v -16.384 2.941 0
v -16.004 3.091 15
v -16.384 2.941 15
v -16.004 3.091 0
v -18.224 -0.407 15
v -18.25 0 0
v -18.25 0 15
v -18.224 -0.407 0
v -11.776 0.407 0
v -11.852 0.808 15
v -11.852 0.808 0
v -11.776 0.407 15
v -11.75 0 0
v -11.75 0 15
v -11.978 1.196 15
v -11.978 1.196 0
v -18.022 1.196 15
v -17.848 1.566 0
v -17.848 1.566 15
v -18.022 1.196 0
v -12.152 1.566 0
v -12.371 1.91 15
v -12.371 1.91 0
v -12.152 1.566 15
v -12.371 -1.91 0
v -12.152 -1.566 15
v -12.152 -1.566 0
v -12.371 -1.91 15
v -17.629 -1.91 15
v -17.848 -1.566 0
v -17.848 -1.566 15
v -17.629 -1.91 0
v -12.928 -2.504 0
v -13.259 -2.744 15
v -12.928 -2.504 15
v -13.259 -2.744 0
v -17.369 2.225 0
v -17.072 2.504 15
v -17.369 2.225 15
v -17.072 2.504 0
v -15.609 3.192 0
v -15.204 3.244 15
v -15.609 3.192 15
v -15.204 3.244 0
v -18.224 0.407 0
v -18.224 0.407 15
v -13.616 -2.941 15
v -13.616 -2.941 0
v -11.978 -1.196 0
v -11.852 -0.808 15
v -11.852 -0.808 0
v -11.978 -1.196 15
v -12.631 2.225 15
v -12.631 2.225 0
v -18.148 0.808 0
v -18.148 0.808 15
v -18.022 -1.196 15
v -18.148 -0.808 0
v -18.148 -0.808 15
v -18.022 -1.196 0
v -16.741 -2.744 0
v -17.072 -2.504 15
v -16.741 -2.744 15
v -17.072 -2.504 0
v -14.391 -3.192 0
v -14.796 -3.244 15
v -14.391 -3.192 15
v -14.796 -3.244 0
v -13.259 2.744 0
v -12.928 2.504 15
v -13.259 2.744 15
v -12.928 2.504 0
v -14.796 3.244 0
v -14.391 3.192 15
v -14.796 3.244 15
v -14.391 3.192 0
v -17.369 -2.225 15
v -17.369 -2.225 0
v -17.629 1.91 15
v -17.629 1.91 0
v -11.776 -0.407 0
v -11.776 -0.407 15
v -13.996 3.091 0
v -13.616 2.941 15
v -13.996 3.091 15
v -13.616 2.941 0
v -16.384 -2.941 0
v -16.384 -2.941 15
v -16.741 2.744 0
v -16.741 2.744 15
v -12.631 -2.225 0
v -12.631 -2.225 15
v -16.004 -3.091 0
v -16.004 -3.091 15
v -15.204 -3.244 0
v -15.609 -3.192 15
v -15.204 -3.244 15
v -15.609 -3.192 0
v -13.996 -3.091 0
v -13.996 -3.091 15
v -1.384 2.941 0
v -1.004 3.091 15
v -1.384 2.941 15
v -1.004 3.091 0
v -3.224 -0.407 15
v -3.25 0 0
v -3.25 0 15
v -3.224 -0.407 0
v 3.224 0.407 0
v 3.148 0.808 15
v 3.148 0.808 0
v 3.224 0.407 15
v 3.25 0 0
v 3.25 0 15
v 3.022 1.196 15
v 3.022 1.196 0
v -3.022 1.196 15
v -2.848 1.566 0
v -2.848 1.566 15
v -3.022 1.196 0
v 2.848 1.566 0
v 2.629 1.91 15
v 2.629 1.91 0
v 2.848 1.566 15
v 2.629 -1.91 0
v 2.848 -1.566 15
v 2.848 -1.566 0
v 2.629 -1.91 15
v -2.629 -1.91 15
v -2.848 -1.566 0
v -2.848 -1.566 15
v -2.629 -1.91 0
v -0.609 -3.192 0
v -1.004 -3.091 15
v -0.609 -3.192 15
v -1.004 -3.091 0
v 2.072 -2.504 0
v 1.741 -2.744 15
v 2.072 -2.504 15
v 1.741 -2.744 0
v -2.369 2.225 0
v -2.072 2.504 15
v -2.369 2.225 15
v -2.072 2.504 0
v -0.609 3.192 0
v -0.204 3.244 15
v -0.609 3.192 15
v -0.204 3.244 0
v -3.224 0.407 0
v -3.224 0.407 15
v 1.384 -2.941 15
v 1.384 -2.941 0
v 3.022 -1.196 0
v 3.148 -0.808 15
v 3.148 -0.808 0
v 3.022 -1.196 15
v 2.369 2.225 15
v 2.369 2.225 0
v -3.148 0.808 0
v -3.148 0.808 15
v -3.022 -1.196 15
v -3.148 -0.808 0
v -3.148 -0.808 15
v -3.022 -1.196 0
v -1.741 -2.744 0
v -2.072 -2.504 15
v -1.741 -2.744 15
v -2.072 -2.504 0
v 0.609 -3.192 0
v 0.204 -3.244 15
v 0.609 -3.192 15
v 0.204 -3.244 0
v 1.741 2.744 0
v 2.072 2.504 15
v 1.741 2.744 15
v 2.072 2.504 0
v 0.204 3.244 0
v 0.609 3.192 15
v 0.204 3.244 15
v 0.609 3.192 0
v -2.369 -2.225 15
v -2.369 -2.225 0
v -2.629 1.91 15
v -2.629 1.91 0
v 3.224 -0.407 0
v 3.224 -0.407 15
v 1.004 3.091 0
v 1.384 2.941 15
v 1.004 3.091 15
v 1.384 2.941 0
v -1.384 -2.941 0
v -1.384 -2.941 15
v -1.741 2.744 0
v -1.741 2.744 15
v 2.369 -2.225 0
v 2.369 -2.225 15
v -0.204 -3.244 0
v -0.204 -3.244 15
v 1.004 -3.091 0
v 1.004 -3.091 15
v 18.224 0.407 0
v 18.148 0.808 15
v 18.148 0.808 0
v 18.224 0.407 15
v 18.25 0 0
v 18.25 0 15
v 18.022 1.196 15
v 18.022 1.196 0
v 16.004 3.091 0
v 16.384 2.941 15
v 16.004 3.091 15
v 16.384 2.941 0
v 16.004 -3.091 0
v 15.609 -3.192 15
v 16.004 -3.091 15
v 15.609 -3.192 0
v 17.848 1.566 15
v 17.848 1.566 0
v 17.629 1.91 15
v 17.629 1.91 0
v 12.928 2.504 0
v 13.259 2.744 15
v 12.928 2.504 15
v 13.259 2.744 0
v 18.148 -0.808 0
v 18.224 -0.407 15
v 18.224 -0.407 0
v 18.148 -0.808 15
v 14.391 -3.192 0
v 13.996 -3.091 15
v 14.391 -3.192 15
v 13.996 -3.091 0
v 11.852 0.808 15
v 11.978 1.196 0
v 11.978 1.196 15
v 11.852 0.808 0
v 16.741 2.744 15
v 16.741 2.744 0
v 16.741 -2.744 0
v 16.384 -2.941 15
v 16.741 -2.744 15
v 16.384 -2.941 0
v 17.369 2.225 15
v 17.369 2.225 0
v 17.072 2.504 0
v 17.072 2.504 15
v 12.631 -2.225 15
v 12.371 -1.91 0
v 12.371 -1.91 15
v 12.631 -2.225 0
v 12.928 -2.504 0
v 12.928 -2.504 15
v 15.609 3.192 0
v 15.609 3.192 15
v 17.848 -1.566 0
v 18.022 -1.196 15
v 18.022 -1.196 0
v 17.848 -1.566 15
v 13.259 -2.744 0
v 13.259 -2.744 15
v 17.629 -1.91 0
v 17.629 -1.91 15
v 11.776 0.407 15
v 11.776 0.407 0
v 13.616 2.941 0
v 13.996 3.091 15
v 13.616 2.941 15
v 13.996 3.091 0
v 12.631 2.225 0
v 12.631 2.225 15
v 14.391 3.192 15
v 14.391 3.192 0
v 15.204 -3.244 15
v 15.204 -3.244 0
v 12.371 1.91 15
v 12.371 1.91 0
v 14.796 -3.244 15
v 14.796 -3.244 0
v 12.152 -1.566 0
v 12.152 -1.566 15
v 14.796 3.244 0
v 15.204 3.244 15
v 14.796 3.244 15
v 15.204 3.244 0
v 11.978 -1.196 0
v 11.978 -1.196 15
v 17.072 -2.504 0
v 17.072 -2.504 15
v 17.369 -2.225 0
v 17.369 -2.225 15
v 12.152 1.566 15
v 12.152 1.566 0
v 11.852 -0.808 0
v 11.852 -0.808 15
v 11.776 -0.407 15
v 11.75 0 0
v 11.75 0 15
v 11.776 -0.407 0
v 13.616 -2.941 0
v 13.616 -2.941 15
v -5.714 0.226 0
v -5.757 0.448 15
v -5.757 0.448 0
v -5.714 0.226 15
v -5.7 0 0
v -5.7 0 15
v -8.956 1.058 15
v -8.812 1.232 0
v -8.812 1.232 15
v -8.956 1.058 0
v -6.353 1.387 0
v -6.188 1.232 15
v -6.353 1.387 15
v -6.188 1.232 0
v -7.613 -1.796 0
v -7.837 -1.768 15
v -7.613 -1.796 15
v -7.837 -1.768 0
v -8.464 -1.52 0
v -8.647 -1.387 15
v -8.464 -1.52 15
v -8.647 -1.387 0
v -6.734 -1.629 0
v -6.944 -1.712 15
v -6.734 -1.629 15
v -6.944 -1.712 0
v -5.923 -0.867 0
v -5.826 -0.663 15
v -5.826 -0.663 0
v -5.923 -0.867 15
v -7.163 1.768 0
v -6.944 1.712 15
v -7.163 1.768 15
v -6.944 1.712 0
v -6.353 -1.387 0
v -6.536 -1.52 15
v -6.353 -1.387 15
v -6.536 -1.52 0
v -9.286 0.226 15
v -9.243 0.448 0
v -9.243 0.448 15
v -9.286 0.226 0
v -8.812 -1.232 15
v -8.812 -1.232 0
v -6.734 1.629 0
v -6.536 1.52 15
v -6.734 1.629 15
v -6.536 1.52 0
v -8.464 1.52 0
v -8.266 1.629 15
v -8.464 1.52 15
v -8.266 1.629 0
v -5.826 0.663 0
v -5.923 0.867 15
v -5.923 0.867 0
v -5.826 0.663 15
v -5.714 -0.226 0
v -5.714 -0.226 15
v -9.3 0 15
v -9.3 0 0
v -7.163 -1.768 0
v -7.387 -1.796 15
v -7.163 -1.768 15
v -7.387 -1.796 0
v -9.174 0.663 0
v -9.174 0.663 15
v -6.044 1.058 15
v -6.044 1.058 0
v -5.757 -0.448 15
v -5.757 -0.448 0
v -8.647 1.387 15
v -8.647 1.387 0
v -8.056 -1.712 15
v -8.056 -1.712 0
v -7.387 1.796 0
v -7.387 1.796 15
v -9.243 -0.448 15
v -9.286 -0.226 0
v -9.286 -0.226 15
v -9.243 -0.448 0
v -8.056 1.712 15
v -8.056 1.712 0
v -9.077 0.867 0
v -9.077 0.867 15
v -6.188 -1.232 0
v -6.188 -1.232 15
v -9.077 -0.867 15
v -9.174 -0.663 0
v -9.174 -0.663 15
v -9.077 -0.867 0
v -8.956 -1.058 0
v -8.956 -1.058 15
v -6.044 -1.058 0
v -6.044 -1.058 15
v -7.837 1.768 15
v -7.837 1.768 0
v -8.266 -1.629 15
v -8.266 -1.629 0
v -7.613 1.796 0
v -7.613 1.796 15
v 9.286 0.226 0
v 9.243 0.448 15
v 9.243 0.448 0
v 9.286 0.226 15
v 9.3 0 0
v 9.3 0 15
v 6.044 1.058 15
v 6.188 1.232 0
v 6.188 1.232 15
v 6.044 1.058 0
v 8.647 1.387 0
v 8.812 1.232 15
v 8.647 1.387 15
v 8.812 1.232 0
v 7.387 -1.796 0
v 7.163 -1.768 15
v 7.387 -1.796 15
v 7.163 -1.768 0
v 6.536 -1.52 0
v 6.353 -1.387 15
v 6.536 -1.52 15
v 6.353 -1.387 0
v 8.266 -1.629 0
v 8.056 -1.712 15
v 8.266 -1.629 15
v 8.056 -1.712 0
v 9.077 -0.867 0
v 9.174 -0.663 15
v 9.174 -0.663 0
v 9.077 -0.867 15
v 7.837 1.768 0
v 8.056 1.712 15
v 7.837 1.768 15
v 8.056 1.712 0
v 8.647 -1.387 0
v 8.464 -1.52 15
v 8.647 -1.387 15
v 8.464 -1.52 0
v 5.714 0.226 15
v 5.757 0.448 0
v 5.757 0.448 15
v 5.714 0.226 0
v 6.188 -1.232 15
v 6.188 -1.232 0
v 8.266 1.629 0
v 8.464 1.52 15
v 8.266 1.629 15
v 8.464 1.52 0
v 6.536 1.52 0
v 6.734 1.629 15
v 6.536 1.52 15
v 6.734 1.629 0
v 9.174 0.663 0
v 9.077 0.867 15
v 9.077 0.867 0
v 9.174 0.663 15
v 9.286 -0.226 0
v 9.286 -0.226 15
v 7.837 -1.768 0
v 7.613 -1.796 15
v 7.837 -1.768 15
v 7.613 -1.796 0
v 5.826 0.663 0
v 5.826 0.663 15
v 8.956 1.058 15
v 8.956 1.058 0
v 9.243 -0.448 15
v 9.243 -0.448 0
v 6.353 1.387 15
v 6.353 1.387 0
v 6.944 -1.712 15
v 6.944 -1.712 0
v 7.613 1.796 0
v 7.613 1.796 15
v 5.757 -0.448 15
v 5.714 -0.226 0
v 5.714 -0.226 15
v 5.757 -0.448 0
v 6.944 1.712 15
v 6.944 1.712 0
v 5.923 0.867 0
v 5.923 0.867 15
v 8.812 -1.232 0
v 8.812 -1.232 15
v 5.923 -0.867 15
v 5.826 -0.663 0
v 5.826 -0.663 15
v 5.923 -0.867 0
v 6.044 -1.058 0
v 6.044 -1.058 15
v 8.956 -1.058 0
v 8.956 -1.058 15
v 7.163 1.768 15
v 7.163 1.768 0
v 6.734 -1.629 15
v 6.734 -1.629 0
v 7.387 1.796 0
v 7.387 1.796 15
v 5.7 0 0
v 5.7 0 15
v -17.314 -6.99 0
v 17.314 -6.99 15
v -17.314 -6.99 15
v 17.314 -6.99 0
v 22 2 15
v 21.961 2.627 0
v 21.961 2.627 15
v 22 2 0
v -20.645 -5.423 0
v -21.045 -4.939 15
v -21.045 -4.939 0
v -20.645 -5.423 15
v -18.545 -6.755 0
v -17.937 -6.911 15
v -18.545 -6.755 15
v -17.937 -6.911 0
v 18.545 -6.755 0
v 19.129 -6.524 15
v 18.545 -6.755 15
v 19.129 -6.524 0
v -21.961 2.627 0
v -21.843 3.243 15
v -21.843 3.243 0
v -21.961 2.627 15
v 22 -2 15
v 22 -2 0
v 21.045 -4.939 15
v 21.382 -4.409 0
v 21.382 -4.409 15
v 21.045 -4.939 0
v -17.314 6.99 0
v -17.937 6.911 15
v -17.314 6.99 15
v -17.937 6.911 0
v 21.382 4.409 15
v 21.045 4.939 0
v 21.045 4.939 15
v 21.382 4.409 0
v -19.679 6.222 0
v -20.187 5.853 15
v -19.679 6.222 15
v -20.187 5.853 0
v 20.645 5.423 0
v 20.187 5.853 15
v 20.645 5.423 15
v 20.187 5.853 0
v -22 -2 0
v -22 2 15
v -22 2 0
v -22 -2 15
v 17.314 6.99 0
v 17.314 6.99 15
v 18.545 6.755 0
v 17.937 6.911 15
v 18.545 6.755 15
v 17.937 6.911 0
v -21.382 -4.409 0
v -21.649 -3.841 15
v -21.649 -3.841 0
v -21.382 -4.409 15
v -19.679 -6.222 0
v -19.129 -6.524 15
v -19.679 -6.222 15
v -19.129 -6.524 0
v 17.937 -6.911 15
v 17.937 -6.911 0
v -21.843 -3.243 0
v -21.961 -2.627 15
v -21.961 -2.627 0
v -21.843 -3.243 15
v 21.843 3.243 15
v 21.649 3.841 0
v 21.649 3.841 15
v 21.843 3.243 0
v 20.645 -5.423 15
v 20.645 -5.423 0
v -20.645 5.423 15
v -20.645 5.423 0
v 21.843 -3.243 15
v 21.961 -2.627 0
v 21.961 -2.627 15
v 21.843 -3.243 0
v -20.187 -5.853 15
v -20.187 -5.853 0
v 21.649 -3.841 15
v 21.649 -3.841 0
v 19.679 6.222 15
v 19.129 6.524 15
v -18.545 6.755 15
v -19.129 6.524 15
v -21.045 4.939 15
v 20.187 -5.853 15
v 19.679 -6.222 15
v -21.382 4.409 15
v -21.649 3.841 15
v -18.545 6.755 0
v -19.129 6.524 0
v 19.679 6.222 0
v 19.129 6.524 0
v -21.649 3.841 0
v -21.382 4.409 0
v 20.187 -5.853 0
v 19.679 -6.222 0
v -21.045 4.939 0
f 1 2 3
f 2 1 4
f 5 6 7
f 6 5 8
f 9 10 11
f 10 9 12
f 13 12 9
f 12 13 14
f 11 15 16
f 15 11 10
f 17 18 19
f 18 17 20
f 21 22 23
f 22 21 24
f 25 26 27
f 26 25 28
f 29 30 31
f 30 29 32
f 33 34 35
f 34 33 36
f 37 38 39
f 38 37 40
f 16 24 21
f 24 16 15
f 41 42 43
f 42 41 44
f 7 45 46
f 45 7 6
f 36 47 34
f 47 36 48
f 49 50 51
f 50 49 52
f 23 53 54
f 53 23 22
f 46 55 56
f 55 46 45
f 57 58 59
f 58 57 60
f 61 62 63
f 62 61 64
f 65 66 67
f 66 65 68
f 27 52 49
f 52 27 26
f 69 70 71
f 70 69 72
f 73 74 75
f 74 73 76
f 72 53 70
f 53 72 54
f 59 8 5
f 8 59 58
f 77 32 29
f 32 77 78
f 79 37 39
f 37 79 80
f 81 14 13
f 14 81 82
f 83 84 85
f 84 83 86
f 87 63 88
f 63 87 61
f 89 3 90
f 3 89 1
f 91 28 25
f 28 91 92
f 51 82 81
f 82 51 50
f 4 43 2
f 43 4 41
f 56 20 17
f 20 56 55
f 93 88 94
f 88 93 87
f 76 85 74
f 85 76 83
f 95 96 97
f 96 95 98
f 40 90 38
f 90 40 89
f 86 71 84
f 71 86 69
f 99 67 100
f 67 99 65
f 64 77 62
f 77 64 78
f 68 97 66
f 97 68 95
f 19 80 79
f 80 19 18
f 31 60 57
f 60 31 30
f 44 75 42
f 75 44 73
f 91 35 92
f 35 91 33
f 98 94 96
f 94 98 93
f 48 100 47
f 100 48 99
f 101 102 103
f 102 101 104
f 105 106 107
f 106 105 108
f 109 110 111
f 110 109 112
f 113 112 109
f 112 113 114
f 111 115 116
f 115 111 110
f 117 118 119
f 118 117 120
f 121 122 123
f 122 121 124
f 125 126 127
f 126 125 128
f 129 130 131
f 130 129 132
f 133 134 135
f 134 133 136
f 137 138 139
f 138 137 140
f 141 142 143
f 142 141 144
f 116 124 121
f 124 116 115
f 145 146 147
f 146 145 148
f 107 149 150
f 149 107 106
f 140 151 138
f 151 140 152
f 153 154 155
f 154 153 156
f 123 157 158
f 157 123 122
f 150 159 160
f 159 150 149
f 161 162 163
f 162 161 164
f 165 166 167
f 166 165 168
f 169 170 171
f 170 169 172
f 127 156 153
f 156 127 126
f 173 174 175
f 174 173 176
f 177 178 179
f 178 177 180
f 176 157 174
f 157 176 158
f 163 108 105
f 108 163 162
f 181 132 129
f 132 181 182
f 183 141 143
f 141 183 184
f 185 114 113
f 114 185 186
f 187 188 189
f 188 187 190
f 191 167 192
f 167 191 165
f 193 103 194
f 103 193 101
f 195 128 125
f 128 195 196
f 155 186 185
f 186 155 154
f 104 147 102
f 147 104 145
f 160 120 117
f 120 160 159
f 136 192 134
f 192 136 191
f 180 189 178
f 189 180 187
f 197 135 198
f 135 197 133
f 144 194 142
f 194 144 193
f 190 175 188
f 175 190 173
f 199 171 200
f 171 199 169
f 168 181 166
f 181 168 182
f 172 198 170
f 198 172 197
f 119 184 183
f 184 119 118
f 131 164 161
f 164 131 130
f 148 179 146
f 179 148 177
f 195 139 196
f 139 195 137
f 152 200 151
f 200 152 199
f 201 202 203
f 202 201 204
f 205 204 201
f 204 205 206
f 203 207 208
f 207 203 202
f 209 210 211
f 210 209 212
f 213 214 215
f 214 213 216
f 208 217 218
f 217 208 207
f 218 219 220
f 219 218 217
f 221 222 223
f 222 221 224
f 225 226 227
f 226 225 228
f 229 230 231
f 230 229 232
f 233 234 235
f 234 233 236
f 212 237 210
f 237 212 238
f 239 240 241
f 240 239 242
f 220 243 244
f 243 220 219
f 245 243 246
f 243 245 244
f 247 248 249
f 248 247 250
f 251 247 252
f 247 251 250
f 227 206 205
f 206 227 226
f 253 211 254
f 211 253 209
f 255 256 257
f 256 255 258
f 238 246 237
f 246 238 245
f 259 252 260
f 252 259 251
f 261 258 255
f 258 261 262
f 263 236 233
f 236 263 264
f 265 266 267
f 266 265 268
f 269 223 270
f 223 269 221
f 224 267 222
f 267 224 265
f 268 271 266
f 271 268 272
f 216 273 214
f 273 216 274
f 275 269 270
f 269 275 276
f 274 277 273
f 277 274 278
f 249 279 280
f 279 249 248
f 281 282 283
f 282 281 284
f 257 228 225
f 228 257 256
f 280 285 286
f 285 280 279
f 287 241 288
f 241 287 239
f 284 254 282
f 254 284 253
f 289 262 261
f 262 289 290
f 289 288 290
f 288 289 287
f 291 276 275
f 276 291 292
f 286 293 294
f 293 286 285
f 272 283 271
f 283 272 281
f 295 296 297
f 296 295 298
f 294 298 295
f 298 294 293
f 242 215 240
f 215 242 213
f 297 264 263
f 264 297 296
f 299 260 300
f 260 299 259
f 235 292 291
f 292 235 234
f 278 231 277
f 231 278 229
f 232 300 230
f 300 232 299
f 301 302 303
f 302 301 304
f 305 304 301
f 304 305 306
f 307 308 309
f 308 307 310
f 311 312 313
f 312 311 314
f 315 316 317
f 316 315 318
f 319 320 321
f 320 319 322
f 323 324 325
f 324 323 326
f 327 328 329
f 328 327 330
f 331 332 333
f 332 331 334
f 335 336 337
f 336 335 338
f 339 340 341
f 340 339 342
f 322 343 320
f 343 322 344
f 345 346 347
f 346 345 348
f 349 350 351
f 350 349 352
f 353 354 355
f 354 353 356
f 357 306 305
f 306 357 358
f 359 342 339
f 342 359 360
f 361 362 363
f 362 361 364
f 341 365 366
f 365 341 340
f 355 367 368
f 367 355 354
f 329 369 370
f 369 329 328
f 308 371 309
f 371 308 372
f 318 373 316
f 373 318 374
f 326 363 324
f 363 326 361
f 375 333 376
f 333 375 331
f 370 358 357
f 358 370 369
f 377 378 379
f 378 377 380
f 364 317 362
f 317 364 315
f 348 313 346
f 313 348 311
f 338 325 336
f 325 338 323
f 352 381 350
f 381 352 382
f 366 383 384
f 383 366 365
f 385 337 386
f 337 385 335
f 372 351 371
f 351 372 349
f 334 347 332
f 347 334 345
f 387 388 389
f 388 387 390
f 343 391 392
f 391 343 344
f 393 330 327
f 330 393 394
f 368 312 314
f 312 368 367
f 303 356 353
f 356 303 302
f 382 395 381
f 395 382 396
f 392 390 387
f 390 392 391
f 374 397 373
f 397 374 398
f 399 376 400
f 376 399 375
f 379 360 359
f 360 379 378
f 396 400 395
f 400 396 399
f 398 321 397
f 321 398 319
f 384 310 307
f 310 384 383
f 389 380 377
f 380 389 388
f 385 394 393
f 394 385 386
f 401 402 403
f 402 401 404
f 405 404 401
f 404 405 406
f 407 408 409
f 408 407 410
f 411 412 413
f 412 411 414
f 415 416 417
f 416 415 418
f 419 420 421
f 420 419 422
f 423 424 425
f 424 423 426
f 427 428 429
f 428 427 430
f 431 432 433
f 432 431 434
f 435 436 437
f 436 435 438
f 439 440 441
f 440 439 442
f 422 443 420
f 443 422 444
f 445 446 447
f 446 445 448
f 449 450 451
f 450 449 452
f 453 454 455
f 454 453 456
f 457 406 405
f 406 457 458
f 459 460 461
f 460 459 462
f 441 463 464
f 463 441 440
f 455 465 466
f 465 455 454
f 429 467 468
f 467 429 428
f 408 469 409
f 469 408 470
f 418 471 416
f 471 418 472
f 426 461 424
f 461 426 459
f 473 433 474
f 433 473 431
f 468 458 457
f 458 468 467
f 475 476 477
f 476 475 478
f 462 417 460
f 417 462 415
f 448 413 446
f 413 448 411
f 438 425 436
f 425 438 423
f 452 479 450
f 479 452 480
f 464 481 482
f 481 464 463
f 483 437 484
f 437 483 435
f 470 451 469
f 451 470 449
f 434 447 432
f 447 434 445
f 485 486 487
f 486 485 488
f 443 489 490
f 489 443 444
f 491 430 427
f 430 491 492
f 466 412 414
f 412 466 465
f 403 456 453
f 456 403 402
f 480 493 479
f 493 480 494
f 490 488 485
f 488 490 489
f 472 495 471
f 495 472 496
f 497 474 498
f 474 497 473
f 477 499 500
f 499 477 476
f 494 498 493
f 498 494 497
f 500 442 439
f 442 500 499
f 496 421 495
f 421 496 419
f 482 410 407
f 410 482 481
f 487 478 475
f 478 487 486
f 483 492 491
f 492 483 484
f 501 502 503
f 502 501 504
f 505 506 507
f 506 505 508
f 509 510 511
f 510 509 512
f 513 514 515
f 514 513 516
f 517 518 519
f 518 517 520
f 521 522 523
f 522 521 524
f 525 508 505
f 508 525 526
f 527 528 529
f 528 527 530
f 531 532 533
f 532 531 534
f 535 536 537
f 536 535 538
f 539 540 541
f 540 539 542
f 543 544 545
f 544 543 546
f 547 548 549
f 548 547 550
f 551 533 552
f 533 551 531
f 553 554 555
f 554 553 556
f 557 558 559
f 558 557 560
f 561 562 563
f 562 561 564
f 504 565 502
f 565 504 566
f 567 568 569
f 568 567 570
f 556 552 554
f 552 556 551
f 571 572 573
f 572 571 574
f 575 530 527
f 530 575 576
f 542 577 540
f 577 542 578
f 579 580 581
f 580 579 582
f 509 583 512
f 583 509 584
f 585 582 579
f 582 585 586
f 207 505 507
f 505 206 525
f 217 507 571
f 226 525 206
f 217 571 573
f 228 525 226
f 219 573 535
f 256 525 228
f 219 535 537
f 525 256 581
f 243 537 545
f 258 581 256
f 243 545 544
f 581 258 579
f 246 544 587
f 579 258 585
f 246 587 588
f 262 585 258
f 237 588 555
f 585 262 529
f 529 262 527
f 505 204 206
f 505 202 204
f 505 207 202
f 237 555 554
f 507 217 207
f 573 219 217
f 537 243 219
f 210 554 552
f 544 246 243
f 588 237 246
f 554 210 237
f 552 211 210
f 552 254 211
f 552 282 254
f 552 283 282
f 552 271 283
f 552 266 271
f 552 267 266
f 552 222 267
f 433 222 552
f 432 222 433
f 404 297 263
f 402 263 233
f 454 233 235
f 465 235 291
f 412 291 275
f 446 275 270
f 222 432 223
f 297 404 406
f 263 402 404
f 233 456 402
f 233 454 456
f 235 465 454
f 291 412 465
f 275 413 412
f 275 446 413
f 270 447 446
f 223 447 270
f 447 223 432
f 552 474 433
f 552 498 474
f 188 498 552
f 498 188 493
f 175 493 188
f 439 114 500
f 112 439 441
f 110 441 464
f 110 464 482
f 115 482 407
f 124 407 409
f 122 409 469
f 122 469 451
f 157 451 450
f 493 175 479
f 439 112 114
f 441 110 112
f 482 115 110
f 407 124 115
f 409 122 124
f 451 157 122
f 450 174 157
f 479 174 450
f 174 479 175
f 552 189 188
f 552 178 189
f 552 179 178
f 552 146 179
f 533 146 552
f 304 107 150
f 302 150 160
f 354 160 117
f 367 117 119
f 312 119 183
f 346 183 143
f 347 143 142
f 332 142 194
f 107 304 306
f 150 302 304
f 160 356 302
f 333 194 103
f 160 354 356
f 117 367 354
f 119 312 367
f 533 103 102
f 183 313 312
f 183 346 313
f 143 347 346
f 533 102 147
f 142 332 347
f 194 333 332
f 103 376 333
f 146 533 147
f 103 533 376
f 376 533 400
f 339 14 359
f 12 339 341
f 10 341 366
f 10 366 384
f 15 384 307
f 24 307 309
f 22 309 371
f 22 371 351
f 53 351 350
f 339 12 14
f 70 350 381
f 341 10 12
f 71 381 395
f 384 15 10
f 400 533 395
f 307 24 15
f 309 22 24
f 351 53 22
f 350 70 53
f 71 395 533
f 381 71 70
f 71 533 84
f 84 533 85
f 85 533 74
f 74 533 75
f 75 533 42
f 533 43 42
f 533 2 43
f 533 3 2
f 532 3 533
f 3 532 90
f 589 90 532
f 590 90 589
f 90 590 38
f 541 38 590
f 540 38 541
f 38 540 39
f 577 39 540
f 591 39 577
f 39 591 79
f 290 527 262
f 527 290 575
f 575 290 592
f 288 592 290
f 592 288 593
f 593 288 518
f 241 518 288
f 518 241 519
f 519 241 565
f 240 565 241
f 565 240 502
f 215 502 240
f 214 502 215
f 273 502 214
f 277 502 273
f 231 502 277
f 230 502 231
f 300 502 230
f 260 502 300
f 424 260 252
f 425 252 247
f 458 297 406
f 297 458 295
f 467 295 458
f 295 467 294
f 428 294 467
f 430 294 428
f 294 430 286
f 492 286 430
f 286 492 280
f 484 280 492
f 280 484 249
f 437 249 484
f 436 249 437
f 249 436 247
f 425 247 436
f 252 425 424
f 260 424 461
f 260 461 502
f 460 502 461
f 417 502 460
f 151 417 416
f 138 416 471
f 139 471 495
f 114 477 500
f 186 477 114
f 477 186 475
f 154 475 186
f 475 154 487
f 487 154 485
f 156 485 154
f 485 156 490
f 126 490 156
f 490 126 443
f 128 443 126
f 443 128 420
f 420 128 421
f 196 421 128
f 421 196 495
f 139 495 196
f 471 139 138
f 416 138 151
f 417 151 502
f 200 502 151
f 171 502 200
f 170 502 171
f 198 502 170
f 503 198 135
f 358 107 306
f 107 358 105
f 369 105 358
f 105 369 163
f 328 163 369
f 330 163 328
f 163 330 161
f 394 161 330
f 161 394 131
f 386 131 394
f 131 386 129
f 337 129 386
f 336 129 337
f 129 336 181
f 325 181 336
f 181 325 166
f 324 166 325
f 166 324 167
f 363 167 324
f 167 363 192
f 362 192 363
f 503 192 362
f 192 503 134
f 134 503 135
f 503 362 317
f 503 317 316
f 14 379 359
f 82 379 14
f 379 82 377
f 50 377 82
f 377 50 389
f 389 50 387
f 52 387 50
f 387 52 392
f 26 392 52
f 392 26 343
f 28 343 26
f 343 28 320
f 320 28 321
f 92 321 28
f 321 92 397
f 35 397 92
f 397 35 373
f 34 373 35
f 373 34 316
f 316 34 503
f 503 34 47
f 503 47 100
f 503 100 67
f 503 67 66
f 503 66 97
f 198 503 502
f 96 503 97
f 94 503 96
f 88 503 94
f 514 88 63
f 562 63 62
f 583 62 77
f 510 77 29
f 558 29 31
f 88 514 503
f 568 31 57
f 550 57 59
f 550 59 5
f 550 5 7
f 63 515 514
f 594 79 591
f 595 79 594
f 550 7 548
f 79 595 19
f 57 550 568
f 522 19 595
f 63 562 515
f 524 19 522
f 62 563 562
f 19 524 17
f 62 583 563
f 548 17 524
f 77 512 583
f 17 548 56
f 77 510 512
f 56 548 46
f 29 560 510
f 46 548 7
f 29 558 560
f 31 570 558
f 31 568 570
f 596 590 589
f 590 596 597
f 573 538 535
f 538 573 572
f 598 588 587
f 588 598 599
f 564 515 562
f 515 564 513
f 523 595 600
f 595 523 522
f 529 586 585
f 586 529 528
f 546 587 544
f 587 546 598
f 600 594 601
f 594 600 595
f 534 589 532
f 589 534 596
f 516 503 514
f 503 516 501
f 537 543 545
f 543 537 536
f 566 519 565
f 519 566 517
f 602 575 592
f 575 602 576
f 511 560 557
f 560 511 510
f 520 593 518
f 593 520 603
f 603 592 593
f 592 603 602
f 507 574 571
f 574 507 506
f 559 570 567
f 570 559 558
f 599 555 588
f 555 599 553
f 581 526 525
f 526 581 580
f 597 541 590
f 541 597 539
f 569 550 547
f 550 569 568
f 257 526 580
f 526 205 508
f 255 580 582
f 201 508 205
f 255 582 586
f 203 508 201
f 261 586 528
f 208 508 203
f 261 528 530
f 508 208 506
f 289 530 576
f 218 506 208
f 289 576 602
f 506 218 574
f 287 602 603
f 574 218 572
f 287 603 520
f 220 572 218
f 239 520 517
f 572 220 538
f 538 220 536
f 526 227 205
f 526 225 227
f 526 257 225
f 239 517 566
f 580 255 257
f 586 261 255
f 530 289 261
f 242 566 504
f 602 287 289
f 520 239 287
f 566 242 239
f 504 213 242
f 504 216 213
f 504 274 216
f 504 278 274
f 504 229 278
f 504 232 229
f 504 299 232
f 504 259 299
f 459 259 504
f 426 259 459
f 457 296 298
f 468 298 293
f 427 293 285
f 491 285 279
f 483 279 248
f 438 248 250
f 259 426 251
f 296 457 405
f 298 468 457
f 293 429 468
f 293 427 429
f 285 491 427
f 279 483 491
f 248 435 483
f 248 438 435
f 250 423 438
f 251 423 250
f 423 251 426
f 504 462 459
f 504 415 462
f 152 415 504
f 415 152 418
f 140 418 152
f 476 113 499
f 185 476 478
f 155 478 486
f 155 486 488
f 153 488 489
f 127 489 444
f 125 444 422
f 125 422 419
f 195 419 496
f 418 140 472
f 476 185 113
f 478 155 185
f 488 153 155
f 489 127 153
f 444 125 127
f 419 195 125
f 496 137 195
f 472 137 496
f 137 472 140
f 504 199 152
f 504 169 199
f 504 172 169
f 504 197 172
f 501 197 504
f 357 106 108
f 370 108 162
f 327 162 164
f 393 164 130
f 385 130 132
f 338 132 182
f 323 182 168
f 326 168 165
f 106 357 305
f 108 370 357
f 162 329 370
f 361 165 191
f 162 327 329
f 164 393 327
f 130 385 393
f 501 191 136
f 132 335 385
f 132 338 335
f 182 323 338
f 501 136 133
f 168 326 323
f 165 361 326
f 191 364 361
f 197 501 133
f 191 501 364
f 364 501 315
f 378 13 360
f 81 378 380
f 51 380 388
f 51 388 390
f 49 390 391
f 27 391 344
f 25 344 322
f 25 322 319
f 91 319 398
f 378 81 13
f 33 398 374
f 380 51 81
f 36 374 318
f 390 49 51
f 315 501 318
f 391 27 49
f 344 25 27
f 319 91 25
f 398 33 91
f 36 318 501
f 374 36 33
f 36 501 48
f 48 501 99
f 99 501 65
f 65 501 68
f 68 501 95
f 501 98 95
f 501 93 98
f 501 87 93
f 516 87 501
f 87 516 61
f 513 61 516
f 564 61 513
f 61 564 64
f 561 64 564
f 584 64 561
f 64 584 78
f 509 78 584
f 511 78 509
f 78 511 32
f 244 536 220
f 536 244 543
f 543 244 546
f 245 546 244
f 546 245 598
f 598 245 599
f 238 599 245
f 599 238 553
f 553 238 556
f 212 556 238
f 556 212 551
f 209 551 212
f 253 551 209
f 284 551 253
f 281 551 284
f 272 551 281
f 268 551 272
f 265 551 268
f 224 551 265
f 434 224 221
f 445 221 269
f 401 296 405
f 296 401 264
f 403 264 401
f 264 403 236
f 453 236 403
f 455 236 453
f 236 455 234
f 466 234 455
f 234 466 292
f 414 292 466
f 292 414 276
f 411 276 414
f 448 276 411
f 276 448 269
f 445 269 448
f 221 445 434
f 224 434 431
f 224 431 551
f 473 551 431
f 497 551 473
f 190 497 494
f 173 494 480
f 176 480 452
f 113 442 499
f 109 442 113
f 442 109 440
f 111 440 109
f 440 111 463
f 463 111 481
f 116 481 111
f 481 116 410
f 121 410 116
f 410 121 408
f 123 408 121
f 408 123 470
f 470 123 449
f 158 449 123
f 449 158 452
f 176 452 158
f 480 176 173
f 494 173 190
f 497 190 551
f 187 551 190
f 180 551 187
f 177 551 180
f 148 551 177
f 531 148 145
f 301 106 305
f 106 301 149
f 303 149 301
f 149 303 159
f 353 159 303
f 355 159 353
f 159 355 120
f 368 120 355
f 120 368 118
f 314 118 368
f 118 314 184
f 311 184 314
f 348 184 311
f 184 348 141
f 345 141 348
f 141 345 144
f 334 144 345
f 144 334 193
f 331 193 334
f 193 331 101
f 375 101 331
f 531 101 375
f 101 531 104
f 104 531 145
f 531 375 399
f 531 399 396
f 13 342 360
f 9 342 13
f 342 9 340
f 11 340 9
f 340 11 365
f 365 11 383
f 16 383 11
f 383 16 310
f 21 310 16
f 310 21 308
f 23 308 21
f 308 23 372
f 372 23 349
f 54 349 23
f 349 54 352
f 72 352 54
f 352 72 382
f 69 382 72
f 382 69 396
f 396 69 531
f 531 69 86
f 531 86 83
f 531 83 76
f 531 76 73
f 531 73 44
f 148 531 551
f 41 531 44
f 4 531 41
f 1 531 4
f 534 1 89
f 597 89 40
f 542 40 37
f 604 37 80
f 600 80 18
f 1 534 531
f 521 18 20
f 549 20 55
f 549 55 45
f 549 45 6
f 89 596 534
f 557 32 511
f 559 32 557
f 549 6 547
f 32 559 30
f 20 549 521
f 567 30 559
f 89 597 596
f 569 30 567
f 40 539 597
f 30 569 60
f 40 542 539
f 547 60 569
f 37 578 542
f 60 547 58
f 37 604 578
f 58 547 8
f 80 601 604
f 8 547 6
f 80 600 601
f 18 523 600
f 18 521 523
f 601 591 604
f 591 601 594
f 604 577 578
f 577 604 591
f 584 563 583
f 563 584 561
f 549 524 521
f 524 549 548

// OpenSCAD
$fn = 50;


difference() {
	union() {
		*color(alpha = 1.0000000000, c = "gray") {
			translate(v = [0, 7, 0]) {
				linear_extrude(height = 1) {
					text(font = "Arial:style=Bold", halign = "center", size = 4.5000000000, text = "COMMENT plate main", valign = "center");
				}
			}
		}
		*color(alpha = 1.0000000000, c = "gray") {
			translate(v = [0, 14, 0]) {
				linear_extrude(height = 1) {
					text(font = "Arial:style=Bold", halign = "center", size = 4.5000000000, text = "COMMENT description oobb_plate_shape_p_type_15_depth_3_width_1_height_15_thickness_true_both_holes", valign = "center");
				}
			}
		}
		hull() {
			translate(v = [-17.0000000000, 2.0000000000, 0]) {
				cylinder(h = 15, r = 5);
			}
			translate(v = [17.0000000000, 2.0000000000, 0]) {
				cylinder(h = 15, r = 5);
			}
			translate(v = [-17.0000000000, -2.0000000000, 0]) {
				cylinder(h = 15, r = 5);
			}
			translate(v = [17.0000000000, -2.0000000000, 0]) {
				cylinder(h = 15, r = 5);
			}
		}
	}
	union() {
		*color(alpha = 1.0000000000, c = "gray") {
			translate(v = [0, 7, 0]) {
				linear_extrude(height = 1) {
					text(font = "Arial:style=Bold", halign = "center", size = 4.5000000000, text = "COMMENT holes main", valign = "center");
				}
			}
		}
		*color(alpha = 1.0000000000, c = "gray") {
			translate(v = [0, 14, 0]) {
				linear_extrude(height = 1) {
					text(font = "Arial:style=Bold", halign = "center", size = 4.5000000000, text = "COMMENT description oobb_holes_shape_n_type_3_width_1_height_15_thickness_true_both_holes", valign = "center");
				}
			}
		}
		translate(v = [-15.0000000000, 0.0000000000, 0]) {
			translate(v = [0, 0, -50]) {
				cylinder(h = 100, r = 3.2500000000);
			}
		}
		translate(v = [0, 0, -50]) {
			cylinder(h = 100, r = 3.2500000000);
		}
		translate(v = [15.0000000000, 0.0000000000, 0]) {
			translate(v = [0, 0, -50]) {
				cylinder(h = 100, r = 3.2500000000);
			}
		}
		translate(v = [-15.0000000000, 0.0000000000, 0]) {
			translate(v = [0, 0, -50]) {
				cylinder(h = 100, r = 1.8000000000);
			}
		}
		translate(v = [-7.5000000000, 0.0000000000, 0]) {
			translate(v = [0, 0, -50]) {
				cylinder(h = 100, r = 1.8000000000);
			}
		}
		translate(v = [0, 0, -50]) {
			cylinder(h = 100, r = 1.8000000000);
		}
		translate(v = [7.5000000000, 0.0000000000, 0]) {
			translate(v = [0, 0, -50]) {
				cylinder(h = 100, r = 1.8000000000);
			}
		}
		translate(v = [15.0000000000, 0.0000000000, 0]) {
			translate(v = [0, 0, -50]) {
				cylinder(h = 100, r = 1.8000000000);
			}
		}
	}
}
